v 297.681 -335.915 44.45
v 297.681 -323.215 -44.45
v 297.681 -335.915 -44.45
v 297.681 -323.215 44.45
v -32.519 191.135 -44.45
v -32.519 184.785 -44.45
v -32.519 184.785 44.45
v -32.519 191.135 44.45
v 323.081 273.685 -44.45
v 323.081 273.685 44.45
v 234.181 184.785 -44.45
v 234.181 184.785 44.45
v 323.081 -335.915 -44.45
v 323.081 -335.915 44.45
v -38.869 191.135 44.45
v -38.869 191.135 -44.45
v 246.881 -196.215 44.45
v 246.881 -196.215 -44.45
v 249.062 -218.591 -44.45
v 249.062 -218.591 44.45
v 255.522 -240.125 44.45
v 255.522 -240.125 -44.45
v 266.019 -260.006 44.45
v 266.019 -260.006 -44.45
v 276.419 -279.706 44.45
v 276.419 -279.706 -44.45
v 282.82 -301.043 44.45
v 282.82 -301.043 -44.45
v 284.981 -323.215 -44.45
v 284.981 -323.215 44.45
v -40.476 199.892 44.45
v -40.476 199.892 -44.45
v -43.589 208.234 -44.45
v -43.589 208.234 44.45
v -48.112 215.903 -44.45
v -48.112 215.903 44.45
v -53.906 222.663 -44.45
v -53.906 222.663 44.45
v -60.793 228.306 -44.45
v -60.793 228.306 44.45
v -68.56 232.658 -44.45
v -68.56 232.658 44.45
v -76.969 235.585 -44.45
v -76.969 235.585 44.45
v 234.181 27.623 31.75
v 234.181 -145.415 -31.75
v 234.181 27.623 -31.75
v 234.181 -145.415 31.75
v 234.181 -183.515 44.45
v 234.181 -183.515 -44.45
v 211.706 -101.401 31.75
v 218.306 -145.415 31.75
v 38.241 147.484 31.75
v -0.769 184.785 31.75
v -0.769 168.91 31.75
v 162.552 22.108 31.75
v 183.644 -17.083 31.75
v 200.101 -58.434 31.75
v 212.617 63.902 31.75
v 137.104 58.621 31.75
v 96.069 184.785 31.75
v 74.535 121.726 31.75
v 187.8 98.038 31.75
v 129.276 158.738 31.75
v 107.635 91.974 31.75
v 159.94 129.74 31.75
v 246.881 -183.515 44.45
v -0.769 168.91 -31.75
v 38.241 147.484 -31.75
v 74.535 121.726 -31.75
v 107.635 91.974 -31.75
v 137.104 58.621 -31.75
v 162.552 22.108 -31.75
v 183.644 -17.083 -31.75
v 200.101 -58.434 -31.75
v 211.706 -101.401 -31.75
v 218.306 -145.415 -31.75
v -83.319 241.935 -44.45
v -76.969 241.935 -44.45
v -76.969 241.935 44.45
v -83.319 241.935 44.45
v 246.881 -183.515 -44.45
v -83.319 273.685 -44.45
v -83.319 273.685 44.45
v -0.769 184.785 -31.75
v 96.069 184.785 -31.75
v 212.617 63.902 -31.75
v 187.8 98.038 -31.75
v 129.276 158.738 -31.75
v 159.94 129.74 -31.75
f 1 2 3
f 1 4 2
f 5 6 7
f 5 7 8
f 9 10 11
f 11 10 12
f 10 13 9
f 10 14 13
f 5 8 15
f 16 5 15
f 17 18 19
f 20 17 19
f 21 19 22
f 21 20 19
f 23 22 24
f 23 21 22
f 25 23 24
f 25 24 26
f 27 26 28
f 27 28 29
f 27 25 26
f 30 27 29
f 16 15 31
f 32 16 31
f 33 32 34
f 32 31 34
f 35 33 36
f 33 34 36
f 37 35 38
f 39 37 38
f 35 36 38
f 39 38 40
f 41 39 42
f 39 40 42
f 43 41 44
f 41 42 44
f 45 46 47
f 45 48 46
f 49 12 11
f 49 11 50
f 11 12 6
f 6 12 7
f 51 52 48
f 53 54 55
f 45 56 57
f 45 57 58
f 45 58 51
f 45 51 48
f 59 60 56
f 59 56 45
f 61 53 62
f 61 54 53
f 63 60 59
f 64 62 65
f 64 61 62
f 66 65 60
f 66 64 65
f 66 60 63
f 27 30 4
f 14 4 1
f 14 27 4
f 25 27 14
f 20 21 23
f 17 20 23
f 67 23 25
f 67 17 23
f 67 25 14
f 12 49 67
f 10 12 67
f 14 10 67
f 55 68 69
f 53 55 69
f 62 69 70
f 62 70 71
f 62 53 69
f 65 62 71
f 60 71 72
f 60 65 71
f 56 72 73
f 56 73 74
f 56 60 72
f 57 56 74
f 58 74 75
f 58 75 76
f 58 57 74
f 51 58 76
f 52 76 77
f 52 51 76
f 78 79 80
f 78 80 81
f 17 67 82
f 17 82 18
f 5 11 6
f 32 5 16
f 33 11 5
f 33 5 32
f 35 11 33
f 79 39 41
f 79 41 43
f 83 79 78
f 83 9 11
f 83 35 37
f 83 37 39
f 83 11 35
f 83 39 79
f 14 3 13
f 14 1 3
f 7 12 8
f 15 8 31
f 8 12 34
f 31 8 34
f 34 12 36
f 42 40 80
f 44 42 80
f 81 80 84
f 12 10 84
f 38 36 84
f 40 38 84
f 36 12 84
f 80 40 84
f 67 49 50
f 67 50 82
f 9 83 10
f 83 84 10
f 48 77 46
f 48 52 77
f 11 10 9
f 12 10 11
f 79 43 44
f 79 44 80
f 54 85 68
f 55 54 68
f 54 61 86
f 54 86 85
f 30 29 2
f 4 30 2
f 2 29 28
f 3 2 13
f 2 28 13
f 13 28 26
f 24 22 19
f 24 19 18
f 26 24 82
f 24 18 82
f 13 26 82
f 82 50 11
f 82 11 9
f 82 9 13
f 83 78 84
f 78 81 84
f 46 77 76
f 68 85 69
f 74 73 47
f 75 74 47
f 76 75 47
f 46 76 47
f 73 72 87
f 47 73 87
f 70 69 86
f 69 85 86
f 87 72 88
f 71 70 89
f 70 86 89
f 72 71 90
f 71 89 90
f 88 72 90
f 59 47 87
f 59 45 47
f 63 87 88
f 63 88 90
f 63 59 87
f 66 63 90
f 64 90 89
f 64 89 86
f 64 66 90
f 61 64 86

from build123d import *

# Parameters (mm, degrees)
BOSS_EXTRUDE1_DEPTH = 44.45
BOSS_EXTRUDE2_DEPTH = 31.75
BOSS_EXTRUDE3_DEPTH = 44.45


with BuildPart() as part:
    # Sketch1 → Boss-Extrude1 (new body, symmetric)
    with BuildSketch(Plane.XY):
        with BuildLine():
            Line((-76.968776984, 235.585), (-76.968776984, 241.935))
            Line((-76.968776984, 241.935), (-83.318776984, 241.935))
            Line((-83.318776984, 241.935), (-83.318776984, 273.685))
            Line((-83.318776984, 273.685), (323.081223016, 273.685))
            Line((323.081223016, 273.685), (234.181223016, 184.785))
            Line((234.181223016, 184.785), (-32.518776984, 184.785))
            Line((-32.518776984, 184.785), (-32.518776984, 191.135))
            Line((-32.518776984, 191.135), (-38.868776984, 191.135))
            ThreePointArc((-38.868776984, 191.135), (-50.860423906, 219.410016924), (-76.968776984, 235.585))
        make_face()
    extrude(amount=BOSS_EXTRUDE1_DEPTH, both=True)


with BuildPart() as body_2:
    # Sketch1_3 → Boss-Extrude2 (new body, symmetric)
    with BuildSketch(Plane.XY):
        with BuildLine():
            ThreePointArc((234.181223016, 27.6225), (174.235964773, 114.210379121), (96.068723016, 184.785))
            Line((96.068723016, 184.785), (-0.768776984, 184.785))
            Line((-0.768776984, 184.785), (-0.768776984, 168.91))
            ThreePointArc((-0.768776984, 168.91), (150.352815584, 40.730352396), (218.306223016, -145.415))
            Line((218.306223016, -145.415), (234.181223016, -145.415))
            Line((234.181223016, -145.415), (234.181223016, 27.6225))
        make_face()
    extrude(amount=BOSS_EXTRUDE2_DEPTH, both=True)


with BuildPart() as body_3:
    # Sketch1_4 → Boss-Extrude3 (new body, symmetric)
    with BuildSketch(Plane.XY):
        with BuildLine():
            Line((323.081223016, -335.915), (323.081223016, 273.685))
            Line((323.081223016, 273.685), (234.181223016, 184.785))
            Line((234.181223016, 184.785), (234.181223016, -183.515))
            Line((234.181223016, -183.515), (246.881223016, -183.515))
            Line((246.881223016, -183.515), (246.881223016, -196.215))
            ThreePointArc((246.881223016, -196.215), (251.768629387, -229.515028089), (266.018608337, -260.006284404))
            ThreePointArc((266.018608337, -260.006284404), (280.138450492, -290.219081757), (284.981223016, -323.215))
            Line((284.981223016, -323.215), (297.681223016, -323.215))
            Line((297.681223016, -323.215), (297.681223016, -335.915))
            Line((297.681223016, -335.915), (323.081223016, -335.915))
        make_face()
    extrude(amount=BOSS_EXTRUDE3_DEPTH, both=True)


solid = Compound([part.part, body_2.part, body_3.part])
